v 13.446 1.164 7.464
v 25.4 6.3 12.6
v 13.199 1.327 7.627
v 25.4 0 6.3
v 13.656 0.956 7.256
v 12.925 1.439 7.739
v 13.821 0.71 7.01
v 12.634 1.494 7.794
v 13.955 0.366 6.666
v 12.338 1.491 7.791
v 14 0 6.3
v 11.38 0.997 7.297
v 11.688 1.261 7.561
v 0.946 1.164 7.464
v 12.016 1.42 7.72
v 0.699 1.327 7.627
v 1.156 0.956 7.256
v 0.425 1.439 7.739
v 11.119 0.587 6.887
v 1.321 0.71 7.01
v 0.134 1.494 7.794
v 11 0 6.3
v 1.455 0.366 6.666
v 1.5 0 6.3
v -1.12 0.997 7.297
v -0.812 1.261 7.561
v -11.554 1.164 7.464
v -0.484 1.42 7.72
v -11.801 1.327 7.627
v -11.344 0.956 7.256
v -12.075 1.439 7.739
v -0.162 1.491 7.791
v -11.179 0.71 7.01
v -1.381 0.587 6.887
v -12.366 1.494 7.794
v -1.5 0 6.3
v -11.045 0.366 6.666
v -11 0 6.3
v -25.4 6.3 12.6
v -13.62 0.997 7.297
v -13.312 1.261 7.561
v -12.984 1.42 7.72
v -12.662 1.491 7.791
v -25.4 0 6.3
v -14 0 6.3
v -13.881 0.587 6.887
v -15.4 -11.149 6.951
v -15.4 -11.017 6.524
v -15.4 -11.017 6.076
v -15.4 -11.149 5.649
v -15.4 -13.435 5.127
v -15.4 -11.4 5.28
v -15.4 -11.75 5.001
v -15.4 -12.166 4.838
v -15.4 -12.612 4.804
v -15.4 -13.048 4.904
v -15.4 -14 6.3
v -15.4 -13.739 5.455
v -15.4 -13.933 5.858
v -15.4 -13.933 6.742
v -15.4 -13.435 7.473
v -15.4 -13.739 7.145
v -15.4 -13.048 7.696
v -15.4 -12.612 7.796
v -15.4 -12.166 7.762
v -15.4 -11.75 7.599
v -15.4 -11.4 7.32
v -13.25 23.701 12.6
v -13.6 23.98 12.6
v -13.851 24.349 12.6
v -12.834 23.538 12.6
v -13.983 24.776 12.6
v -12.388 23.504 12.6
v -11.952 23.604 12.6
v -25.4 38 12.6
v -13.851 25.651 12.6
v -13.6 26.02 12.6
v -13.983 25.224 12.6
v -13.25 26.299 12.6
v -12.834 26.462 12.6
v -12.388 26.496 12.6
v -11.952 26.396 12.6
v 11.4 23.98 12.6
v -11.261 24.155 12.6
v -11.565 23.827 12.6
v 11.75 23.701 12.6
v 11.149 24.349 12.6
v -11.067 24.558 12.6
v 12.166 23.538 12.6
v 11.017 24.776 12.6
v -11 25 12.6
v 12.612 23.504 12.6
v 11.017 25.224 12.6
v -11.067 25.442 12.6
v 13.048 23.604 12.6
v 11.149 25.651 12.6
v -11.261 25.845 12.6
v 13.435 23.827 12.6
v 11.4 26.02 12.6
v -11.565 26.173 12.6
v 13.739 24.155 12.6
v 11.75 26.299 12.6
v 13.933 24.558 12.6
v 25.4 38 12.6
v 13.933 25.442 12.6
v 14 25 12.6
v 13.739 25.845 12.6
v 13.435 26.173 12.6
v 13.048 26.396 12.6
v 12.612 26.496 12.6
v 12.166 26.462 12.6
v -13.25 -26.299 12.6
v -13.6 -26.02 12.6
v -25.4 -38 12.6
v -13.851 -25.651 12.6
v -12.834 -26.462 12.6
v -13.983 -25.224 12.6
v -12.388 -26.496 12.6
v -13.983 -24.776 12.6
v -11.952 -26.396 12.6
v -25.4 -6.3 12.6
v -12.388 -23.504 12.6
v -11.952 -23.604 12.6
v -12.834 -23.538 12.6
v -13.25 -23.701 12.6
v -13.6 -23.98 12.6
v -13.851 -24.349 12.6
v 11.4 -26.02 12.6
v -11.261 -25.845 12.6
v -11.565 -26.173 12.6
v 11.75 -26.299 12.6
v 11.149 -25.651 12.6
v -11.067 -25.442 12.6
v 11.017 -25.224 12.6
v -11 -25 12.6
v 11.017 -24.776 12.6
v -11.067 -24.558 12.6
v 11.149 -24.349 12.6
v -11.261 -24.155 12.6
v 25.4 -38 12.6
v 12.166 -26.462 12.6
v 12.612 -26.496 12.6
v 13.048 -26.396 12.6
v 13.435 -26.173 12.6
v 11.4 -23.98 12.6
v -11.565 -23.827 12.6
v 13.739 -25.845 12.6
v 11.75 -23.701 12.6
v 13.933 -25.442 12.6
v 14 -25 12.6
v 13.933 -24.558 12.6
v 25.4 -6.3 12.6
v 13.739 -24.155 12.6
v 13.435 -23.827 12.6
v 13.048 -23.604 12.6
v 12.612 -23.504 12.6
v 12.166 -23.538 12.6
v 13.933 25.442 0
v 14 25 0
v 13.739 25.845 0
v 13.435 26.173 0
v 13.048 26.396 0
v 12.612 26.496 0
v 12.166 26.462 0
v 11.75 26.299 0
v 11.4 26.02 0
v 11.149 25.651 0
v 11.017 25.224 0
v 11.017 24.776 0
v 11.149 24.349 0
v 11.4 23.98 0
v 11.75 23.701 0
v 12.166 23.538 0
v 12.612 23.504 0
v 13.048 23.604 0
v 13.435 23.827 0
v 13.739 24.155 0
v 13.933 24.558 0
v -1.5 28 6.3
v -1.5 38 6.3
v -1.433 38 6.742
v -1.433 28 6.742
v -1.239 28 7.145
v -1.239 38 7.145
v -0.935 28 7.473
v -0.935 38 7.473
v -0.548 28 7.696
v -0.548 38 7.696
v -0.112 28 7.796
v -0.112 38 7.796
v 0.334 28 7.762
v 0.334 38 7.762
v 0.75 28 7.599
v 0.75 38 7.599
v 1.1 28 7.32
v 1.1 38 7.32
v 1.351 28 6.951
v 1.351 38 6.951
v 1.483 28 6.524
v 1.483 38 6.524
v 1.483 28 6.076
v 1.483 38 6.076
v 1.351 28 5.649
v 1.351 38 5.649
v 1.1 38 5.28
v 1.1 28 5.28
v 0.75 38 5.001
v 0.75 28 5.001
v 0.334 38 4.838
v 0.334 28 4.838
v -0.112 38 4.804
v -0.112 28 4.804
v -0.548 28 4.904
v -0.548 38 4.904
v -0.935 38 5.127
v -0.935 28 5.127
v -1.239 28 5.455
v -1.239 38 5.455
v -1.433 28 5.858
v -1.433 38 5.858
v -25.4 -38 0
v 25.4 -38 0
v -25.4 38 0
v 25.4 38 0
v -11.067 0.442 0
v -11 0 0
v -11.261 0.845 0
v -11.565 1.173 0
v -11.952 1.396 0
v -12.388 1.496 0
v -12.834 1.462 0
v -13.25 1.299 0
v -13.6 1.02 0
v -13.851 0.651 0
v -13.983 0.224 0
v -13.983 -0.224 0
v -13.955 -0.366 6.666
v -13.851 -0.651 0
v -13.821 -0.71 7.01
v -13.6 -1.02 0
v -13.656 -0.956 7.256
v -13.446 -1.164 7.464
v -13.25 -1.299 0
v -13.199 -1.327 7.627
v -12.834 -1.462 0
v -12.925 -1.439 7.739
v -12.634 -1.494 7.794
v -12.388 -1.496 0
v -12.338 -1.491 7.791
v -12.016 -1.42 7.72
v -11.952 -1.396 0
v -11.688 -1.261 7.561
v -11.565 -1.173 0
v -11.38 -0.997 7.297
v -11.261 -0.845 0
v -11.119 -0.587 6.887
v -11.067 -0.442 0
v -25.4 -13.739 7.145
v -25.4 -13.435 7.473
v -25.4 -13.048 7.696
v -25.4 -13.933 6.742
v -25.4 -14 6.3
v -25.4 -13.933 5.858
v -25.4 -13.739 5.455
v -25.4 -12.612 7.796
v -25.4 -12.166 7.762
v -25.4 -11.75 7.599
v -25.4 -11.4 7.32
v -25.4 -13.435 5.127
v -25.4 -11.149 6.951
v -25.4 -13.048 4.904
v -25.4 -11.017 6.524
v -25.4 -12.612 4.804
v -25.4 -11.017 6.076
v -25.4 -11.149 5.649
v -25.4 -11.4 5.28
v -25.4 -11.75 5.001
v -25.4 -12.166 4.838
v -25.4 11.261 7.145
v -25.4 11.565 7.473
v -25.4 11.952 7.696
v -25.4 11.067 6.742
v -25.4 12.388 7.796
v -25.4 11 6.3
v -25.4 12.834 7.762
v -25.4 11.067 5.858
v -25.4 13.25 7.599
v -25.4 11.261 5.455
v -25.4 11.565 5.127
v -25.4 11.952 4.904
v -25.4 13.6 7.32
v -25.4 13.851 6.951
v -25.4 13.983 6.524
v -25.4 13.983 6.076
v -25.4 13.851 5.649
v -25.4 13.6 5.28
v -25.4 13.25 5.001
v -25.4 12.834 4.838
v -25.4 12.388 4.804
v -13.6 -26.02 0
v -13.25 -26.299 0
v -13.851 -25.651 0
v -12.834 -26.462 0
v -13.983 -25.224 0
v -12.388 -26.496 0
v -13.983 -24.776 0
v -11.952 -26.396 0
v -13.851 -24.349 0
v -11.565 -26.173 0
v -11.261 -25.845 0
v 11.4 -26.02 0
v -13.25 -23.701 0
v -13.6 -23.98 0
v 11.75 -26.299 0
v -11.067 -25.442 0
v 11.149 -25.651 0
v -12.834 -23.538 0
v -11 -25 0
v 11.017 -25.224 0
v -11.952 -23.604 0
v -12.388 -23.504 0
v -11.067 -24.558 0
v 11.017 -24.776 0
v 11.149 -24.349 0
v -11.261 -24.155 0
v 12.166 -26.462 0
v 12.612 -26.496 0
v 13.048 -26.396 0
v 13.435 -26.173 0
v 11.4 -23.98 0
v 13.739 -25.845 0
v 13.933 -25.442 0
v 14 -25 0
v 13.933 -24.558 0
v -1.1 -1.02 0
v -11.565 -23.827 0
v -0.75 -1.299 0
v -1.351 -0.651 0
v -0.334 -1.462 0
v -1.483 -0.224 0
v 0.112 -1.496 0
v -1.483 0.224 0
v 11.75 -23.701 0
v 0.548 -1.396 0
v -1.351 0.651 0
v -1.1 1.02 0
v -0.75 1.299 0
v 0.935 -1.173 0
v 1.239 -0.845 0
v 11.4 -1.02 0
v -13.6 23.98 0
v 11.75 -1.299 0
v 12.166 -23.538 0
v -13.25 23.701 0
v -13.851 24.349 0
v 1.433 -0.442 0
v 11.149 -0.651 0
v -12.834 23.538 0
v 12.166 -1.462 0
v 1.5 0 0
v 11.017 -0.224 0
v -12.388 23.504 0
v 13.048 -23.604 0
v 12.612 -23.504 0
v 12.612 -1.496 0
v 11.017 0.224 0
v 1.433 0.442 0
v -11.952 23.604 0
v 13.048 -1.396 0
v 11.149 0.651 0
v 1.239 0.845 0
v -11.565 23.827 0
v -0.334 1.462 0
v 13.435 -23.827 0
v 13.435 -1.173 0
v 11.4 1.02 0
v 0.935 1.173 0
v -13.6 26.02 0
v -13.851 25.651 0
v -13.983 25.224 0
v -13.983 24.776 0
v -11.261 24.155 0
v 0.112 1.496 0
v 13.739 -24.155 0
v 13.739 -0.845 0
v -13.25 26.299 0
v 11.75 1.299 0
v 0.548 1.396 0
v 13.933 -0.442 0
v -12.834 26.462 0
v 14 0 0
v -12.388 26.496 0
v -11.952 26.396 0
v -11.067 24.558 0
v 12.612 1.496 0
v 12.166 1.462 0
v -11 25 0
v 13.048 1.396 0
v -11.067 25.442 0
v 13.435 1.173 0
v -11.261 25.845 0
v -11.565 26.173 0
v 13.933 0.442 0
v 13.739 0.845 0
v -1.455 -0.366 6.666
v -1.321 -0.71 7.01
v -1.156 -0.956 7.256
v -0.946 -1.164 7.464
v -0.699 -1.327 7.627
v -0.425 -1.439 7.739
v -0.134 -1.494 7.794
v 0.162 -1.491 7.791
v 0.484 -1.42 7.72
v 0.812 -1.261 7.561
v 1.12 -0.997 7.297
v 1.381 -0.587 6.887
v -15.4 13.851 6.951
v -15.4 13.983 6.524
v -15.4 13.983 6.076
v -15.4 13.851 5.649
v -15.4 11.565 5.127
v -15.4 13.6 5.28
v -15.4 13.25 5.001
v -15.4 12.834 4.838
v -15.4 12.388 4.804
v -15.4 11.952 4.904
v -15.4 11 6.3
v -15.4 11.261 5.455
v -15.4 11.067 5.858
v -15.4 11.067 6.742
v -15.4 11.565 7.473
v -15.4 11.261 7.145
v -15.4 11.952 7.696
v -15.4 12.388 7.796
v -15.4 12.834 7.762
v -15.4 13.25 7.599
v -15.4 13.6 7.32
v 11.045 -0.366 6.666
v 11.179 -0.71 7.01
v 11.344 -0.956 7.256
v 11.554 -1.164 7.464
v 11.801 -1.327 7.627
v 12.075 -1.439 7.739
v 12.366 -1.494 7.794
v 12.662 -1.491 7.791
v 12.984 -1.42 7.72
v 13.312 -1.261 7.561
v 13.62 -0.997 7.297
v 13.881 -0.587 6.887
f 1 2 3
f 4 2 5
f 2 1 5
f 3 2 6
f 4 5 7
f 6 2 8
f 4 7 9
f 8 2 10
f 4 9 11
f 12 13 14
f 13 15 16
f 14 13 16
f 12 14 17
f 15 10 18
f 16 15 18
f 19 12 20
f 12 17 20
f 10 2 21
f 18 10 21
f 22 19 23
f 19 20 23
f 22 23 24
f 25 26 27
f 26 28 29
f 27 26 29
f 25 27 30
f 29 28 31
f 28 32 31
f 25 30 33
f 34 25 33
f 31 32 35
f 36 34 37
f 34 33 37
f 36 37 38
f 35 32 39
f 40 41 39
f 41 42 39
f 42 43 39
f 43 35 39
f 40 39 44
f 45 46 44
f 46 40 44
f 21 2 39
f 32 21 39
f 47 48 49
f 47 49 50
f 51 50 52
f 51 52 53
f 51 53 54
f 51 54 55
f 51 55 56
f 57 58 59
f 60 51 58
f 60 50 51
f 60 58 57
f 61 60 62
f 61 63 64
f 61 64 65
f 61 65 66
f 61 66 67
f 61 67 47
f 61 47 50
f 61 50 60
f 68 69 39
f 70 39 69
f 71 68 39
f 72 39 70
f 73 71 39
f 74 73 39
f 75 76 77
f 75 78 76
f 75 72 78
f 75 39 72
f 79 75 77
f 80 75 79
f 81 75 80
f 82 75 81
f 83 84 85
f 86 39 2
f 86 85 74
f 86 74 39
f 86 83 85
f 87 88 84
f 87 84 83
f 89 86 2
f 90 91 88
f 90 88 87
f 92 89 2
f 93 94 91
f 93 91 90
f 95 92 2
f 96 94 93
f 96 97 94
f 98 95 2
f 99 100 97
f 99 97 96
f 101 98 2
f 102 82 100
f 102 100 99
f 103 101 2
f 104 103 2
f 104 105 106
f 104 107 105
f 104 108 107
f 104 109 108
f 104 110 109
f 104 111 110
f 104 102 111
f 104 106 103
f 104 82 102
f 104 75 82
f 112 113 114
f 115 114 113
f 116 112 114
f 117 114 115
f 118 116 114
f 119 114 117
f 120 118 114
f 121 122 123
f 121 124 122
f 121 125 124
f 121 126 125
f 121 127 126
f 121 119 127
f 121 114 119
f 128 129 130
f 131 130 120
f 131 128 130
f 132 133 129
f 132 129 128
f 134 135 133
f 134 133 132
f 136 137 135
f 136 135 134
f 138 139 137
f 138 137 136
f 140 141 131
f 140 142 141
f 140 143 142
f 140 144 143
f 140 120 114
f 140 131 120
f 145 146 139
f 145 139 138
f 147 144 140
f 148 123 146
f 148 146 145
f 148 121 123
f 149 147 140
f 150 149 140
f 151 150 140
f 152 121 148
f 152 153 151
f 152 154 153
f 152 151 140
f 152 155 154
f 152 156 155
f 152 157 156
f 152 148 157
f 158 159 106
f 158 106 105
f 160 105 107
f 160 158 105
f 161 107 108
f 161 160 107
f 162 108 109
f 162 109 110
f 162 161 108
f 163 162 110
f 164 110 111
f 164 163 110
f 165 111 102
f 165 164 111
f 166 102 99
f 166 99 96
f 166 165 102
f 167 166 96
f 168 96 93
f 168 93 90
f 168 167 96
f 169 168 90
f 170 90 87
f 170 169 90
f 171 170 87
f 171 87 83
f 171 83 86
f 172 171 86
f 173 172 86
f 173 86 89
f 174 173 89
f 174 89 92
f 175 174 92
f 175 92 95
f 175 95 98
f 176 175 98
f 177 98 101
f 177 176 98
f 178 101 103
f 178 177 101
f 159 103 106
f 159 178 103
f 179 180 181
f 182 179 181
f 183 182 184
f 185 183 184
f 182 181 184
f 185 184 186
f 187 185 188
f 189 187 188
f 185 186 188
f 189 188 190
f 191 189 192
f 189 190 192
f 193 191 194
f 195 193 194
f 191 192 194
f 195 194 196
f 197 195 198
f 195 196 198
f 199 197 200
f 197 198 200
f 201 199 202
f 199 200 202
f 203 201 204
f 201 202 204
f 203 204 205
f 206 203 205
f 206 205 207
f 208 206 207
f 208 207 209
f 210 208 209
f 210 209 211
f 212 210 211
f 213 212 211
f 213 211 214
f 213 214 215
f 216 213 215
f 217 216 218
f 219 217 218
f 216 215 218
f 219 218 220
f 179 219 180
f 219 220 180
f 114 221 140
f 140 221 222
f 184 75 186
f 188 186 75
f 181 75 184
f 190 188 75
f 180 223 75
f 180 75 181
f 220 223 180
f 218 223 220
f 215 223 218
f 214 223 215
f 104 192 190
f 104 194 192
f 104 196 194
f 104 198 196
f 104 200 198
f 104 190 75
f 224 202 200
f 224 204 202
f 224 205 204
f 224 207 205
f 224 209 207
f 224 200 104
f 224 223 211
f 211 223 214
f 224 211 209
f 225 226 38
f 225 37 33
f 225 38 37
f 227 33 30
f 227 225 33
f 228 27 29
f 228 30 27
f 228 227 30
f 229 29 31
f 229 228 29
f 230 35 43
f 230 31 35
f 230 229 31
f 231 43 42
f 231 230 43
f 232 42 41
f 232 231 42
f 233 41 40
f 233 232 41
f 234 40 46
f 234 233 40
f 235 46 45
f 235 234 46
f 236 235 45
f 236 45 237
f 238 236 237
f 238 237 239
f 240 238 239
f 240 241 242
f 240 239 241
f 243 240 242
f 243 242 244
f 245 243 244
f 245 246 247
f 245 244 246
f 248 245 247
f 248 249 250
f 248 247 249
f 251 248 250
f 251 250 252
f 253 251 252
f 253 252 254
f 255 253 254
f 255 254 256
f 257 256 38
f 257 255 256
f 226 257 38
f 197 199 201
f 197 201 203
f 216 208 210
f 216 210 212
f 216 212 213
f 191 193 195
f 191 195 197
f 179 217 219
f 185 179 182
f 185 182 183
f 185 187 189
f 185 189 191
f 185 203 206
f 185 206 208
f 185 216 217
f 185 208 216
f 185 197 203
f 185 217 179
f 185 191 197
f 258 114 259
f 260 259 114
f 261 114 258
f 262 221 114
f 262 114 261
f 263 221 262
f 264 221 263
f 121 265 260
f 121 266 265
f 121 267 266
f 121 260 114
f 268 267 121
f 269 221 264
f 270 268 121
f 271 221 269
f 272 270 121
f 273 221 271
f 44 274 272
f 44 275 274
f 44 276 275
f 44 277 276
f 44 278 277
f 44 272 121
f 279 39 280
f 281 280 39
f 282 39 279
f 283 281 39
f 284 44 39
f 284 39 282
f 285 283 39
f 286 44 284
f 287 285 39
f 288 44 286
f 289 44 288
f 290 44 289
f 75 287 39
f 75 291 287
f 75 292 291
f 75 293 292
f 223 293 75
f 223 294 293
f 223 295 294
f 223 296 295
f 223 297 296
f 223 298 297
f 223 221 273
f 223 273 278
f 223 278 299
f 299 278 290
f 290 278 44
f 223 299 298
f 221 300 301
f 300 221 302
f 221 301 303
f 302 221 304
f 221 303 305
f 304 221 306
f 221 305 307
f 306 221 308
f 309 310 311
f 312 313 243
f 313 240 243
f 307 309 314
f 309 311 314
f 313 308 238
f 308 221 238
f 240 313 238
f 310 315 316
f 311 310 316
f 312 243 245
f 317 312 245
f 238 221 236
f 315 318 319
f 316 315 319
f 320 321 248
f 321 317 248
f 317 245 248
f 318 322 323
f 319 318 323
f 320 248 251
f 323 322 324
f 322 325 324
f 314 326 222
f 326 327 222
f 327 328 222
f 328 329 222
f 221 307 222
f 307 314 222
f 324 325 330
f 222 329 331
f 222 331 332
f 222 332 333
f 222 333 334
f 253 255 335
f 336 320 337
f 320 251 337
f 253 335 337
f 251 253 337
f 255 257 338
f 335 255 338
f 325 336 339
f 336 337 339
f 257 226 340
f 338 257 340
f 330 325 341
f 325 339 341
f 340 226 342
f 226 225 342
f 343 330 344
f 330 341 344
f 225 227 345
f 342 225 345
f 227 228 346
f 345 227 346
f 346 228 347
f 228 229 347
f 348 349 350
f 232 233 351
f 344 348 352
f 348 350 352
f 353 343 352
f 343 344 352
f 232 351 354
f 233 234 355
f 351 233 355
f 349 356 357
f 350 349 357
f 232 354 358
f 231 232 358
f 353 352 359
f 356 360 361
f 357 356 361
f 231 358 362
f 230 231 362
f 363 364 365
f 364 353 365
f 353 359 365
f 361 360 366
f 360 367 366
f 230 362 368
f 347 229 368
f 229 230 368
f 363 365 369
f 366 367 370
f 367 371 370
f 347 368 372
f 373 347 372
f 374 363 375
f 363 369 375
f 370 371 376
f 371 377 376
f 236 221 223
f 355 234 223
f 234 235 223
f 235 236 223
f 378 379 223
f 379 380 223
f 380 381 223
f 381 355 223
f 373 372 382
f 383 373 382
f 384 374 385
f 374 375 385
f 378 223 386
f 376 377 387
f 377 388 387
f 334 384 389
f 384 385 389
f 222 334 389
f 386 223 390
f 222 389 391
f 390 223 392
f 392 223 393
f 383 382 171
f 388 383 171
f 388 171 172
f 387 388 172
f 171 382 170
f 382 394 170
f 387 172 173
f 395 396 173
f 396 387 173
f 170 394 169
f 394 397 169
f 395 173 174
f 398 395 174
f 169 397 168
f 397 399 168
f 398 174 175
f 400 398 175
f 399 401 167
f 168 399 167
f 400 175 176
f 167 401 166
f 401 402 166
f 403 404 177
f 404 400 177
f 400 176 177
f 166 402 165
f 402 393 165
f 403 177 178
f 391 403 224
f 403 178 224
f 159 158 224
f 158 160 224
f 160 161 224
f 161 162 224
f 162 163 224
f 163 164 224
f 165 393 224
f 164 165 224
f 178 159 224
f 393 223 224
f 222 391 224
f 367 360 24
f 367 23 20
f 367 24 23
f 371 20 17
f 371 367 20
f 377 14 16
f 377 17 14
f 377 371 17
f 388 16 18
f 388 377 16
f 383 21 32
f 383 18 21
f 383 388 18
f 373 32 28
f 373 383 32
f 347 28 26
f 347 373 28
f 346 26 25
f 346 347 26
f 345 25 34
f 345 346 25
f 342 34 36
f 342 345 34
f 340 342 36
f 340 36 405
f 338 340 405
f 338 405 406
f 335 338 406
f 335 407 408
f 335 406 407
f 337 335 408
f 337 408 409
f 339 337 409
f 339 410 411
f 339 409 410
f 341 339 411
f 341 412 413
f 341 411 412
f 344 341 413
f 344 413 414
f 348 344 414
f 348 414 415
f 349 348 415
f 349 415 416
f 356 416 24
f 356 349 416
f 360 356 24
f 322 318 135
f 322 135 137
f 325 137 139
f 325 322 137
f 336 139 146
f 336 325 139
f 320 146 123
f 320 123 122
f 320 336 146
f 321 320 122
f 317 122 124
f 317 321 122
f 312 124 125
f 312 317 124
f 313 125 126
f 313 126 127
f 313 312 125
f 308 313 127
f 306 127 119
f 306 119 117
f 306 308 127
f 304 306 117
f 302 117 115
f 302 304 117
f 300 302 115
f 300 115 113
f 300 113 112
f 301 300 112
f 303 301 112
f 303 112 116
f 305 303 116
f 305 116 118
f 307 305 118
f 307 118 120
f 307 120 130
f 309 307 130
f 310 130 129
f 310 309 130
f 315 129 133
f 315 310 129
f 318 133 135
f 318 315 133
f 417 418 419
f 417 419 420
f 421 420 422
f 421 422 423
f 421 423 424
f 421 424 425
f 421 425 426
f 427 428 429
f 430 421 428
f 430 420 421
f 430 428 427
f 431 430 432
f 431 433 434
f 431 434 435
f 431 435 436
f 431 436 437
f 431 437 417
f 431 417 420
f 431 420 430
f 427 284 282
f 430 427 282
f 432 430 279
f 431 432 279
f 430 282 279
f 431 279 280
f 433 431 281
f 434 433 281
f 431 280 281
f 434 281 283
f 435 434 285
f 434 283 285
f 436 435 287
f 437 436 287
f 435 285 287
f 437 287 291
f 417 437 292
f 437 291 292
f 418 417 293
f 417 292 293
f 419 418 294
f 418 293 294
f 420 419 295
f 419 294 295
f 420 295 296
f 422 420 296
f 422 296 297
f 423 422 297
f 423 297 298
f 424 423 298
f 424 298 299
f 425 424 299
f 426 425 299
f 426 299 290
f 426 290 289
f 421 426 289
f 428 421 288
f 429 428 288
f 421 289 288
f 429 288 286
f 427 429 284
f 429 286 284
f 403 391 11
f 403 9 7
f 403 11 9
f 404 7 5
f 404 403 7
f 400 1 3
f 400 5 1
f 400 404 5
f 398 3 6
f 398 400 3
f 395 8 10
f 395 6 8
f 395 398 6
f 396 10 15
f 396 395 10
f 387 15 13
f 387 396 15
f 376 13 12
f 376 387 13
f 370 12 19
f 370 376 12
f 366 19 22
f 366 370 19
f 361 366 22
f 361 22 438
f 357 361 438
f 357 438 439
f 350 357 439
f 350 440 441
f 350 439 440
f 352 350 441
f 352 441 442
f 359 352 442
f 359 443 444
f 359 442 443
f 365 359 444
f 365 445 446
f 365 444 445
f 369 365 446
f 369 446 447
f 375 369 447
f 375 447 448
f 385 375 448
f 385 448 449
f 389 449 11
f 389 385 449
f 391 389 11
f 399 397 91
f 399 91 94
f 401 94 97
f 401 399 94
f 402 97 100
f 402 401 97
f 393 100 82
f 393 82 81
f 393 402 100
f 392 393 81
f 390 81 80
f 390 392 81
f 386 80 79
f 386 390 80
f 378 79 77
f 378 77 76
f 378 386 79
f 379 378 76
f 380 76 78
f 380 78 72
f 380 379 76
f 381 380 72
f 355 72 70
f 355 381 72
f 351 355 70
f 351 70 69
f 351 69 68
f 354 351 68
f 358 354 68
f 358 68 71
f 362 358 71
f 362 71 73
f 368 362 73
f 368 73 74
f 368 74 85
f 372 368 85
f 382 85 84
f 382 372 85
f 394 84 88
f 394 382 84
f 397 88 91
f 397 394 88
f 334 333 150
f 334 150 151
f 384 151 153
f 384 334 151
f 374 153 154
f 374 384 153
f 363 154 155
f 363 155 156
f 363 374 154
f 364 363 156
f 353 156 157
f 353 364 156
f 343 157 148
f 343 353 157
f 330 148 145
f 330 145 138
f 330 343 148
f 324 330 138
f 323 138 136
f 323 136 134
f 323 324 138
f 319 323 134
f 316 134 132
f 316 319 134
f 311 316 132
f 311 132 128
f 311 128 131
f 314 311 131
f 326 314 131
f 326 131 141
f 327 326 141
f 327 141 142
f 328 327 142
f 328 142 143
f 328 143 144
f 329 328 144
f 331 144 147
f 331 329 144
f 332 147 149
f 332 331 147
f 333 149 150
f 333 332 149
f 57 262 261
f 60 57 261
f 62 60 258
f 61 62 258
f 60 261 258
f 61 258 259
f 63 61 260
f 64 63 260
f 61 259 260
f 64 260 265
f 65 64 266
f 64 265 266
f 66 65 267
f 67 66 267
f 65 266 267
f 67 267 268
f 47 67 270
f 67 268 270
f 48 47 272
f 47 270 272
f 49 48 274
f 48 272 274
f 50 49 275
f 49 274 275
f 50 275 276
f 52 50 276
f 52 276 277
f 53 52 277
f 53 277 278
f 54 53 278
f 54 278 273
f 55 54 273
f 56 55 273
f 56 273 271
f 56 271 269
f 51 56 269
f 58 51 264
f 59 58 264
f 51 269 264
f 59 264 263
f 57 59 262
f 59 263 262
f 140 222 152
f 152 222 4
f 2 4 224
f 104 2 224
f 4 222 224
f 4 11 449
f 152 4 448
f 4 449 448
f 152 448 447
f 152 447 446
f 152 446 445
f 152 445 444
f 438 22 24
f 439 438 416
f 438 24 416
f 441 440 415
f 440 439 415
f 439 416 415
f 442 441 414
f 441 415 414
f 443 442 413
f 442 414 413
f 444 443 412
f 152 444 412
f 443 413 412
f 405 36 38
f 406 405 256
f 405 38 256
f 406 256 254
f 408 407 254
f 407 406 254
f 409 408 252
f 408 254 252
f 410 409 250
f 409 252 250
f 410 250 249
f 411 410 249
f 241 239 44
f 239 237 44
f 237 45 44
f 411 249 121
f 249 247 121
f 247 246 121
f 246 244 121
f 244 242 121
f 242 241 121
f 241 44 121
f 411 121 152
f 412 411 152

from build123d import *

# Parameters (mm, degrees)
F0_W     = 50.8
F0_H     = 76
F0_R     = 1.5
F1_DEPTH = 12.6
F2_R     = 1.5
F3_DEPTH = 10
F4_DEPTH = 50.8
F5_DEPTH = 12
F6_R     = 1.5
F7_DEPTH = 10


with BuildPart() as f1:
    # F0 (on Top) → F1 (new body)
    with BuildSketch(Plane.XY):
        Rectangle(F0_W, F0_H)
        with Locations((-12.5, -25)):
            Circle(F0_R, mode=Mode.SUBTRACT)
        with Locations((12.5, -25)):
            Circle(F0_R, mode=Mode.SUBTRACT)
        with Locations((-12.5, 0)):
            Circle(F0_R, mode=Mode.SUBTRACT)
        Circle(F0_R, mode=Mode.SUBTRACT)
        with Locations((-12.5, 25)):
            Circle(F0_R, mode=Mode.SUBTRACT)
        with Locations((12.5, 0)):
            Circle(F0_R, mode=Mode.SUBTRACT)
        with Locations((12.5, 25)):
            Circle(F0_R, mode=Mode.SUBTRACT)
    extrude(amount=F1_DEPTH)

    # F2 (on face) → F3 (cut)
    with BuildSketch(Plane(origin=(-25.4, 0, 0), x_dir=(0, -1, 0), z_dir=(-1, 0, 0))):
        with Locations((-12.5, 6.3)):
            Circle(F2_R)
        with Locations((12.5, 6.3)):
            Circle(F2_R)
    extrude(amount=-F3_DEPTH, mode=Mode.SUBTRACT)

    # F2 (on face) → F4 (cut)
    with BuildSketch(Plane(origin=(-25.4, 0, 0), x_dir=(0, -1, 0), z_dir=(-1, 0, 0))):
        Polygon((6.3, 12.6), (0, 12.6), (-6.3, 12.6), (0, 6.3), align=None)
    extrude(amount=-F4_DEPTH, mode=Mode.SUBTRACT)

    # F0 (on Top) → F5 (cut)
    with BuildSketch(Plane.XY):
        with Locations((12.5, 0)):
            Circle(F0_R)
        Circle(F0_R)
        with Locations((-12.5, 0)):
            Circle(F0_R)
    extrude(amount=F5_DEPTH, mode=Mode.SUBTRACT)

    # F6 (on face) → F7 (cut)
    with BuildSketch(Plane(origin=(0, 38, 0), x_dir=(-1, 0, 0), z_dir=(0, 1, 0))):
        with Locations((0, 6.3)):
            Circle(F6_R)
    extrude(amount=-F7_DEPTH, mode=Mode.SUBTRACT)


solid = f1.part
